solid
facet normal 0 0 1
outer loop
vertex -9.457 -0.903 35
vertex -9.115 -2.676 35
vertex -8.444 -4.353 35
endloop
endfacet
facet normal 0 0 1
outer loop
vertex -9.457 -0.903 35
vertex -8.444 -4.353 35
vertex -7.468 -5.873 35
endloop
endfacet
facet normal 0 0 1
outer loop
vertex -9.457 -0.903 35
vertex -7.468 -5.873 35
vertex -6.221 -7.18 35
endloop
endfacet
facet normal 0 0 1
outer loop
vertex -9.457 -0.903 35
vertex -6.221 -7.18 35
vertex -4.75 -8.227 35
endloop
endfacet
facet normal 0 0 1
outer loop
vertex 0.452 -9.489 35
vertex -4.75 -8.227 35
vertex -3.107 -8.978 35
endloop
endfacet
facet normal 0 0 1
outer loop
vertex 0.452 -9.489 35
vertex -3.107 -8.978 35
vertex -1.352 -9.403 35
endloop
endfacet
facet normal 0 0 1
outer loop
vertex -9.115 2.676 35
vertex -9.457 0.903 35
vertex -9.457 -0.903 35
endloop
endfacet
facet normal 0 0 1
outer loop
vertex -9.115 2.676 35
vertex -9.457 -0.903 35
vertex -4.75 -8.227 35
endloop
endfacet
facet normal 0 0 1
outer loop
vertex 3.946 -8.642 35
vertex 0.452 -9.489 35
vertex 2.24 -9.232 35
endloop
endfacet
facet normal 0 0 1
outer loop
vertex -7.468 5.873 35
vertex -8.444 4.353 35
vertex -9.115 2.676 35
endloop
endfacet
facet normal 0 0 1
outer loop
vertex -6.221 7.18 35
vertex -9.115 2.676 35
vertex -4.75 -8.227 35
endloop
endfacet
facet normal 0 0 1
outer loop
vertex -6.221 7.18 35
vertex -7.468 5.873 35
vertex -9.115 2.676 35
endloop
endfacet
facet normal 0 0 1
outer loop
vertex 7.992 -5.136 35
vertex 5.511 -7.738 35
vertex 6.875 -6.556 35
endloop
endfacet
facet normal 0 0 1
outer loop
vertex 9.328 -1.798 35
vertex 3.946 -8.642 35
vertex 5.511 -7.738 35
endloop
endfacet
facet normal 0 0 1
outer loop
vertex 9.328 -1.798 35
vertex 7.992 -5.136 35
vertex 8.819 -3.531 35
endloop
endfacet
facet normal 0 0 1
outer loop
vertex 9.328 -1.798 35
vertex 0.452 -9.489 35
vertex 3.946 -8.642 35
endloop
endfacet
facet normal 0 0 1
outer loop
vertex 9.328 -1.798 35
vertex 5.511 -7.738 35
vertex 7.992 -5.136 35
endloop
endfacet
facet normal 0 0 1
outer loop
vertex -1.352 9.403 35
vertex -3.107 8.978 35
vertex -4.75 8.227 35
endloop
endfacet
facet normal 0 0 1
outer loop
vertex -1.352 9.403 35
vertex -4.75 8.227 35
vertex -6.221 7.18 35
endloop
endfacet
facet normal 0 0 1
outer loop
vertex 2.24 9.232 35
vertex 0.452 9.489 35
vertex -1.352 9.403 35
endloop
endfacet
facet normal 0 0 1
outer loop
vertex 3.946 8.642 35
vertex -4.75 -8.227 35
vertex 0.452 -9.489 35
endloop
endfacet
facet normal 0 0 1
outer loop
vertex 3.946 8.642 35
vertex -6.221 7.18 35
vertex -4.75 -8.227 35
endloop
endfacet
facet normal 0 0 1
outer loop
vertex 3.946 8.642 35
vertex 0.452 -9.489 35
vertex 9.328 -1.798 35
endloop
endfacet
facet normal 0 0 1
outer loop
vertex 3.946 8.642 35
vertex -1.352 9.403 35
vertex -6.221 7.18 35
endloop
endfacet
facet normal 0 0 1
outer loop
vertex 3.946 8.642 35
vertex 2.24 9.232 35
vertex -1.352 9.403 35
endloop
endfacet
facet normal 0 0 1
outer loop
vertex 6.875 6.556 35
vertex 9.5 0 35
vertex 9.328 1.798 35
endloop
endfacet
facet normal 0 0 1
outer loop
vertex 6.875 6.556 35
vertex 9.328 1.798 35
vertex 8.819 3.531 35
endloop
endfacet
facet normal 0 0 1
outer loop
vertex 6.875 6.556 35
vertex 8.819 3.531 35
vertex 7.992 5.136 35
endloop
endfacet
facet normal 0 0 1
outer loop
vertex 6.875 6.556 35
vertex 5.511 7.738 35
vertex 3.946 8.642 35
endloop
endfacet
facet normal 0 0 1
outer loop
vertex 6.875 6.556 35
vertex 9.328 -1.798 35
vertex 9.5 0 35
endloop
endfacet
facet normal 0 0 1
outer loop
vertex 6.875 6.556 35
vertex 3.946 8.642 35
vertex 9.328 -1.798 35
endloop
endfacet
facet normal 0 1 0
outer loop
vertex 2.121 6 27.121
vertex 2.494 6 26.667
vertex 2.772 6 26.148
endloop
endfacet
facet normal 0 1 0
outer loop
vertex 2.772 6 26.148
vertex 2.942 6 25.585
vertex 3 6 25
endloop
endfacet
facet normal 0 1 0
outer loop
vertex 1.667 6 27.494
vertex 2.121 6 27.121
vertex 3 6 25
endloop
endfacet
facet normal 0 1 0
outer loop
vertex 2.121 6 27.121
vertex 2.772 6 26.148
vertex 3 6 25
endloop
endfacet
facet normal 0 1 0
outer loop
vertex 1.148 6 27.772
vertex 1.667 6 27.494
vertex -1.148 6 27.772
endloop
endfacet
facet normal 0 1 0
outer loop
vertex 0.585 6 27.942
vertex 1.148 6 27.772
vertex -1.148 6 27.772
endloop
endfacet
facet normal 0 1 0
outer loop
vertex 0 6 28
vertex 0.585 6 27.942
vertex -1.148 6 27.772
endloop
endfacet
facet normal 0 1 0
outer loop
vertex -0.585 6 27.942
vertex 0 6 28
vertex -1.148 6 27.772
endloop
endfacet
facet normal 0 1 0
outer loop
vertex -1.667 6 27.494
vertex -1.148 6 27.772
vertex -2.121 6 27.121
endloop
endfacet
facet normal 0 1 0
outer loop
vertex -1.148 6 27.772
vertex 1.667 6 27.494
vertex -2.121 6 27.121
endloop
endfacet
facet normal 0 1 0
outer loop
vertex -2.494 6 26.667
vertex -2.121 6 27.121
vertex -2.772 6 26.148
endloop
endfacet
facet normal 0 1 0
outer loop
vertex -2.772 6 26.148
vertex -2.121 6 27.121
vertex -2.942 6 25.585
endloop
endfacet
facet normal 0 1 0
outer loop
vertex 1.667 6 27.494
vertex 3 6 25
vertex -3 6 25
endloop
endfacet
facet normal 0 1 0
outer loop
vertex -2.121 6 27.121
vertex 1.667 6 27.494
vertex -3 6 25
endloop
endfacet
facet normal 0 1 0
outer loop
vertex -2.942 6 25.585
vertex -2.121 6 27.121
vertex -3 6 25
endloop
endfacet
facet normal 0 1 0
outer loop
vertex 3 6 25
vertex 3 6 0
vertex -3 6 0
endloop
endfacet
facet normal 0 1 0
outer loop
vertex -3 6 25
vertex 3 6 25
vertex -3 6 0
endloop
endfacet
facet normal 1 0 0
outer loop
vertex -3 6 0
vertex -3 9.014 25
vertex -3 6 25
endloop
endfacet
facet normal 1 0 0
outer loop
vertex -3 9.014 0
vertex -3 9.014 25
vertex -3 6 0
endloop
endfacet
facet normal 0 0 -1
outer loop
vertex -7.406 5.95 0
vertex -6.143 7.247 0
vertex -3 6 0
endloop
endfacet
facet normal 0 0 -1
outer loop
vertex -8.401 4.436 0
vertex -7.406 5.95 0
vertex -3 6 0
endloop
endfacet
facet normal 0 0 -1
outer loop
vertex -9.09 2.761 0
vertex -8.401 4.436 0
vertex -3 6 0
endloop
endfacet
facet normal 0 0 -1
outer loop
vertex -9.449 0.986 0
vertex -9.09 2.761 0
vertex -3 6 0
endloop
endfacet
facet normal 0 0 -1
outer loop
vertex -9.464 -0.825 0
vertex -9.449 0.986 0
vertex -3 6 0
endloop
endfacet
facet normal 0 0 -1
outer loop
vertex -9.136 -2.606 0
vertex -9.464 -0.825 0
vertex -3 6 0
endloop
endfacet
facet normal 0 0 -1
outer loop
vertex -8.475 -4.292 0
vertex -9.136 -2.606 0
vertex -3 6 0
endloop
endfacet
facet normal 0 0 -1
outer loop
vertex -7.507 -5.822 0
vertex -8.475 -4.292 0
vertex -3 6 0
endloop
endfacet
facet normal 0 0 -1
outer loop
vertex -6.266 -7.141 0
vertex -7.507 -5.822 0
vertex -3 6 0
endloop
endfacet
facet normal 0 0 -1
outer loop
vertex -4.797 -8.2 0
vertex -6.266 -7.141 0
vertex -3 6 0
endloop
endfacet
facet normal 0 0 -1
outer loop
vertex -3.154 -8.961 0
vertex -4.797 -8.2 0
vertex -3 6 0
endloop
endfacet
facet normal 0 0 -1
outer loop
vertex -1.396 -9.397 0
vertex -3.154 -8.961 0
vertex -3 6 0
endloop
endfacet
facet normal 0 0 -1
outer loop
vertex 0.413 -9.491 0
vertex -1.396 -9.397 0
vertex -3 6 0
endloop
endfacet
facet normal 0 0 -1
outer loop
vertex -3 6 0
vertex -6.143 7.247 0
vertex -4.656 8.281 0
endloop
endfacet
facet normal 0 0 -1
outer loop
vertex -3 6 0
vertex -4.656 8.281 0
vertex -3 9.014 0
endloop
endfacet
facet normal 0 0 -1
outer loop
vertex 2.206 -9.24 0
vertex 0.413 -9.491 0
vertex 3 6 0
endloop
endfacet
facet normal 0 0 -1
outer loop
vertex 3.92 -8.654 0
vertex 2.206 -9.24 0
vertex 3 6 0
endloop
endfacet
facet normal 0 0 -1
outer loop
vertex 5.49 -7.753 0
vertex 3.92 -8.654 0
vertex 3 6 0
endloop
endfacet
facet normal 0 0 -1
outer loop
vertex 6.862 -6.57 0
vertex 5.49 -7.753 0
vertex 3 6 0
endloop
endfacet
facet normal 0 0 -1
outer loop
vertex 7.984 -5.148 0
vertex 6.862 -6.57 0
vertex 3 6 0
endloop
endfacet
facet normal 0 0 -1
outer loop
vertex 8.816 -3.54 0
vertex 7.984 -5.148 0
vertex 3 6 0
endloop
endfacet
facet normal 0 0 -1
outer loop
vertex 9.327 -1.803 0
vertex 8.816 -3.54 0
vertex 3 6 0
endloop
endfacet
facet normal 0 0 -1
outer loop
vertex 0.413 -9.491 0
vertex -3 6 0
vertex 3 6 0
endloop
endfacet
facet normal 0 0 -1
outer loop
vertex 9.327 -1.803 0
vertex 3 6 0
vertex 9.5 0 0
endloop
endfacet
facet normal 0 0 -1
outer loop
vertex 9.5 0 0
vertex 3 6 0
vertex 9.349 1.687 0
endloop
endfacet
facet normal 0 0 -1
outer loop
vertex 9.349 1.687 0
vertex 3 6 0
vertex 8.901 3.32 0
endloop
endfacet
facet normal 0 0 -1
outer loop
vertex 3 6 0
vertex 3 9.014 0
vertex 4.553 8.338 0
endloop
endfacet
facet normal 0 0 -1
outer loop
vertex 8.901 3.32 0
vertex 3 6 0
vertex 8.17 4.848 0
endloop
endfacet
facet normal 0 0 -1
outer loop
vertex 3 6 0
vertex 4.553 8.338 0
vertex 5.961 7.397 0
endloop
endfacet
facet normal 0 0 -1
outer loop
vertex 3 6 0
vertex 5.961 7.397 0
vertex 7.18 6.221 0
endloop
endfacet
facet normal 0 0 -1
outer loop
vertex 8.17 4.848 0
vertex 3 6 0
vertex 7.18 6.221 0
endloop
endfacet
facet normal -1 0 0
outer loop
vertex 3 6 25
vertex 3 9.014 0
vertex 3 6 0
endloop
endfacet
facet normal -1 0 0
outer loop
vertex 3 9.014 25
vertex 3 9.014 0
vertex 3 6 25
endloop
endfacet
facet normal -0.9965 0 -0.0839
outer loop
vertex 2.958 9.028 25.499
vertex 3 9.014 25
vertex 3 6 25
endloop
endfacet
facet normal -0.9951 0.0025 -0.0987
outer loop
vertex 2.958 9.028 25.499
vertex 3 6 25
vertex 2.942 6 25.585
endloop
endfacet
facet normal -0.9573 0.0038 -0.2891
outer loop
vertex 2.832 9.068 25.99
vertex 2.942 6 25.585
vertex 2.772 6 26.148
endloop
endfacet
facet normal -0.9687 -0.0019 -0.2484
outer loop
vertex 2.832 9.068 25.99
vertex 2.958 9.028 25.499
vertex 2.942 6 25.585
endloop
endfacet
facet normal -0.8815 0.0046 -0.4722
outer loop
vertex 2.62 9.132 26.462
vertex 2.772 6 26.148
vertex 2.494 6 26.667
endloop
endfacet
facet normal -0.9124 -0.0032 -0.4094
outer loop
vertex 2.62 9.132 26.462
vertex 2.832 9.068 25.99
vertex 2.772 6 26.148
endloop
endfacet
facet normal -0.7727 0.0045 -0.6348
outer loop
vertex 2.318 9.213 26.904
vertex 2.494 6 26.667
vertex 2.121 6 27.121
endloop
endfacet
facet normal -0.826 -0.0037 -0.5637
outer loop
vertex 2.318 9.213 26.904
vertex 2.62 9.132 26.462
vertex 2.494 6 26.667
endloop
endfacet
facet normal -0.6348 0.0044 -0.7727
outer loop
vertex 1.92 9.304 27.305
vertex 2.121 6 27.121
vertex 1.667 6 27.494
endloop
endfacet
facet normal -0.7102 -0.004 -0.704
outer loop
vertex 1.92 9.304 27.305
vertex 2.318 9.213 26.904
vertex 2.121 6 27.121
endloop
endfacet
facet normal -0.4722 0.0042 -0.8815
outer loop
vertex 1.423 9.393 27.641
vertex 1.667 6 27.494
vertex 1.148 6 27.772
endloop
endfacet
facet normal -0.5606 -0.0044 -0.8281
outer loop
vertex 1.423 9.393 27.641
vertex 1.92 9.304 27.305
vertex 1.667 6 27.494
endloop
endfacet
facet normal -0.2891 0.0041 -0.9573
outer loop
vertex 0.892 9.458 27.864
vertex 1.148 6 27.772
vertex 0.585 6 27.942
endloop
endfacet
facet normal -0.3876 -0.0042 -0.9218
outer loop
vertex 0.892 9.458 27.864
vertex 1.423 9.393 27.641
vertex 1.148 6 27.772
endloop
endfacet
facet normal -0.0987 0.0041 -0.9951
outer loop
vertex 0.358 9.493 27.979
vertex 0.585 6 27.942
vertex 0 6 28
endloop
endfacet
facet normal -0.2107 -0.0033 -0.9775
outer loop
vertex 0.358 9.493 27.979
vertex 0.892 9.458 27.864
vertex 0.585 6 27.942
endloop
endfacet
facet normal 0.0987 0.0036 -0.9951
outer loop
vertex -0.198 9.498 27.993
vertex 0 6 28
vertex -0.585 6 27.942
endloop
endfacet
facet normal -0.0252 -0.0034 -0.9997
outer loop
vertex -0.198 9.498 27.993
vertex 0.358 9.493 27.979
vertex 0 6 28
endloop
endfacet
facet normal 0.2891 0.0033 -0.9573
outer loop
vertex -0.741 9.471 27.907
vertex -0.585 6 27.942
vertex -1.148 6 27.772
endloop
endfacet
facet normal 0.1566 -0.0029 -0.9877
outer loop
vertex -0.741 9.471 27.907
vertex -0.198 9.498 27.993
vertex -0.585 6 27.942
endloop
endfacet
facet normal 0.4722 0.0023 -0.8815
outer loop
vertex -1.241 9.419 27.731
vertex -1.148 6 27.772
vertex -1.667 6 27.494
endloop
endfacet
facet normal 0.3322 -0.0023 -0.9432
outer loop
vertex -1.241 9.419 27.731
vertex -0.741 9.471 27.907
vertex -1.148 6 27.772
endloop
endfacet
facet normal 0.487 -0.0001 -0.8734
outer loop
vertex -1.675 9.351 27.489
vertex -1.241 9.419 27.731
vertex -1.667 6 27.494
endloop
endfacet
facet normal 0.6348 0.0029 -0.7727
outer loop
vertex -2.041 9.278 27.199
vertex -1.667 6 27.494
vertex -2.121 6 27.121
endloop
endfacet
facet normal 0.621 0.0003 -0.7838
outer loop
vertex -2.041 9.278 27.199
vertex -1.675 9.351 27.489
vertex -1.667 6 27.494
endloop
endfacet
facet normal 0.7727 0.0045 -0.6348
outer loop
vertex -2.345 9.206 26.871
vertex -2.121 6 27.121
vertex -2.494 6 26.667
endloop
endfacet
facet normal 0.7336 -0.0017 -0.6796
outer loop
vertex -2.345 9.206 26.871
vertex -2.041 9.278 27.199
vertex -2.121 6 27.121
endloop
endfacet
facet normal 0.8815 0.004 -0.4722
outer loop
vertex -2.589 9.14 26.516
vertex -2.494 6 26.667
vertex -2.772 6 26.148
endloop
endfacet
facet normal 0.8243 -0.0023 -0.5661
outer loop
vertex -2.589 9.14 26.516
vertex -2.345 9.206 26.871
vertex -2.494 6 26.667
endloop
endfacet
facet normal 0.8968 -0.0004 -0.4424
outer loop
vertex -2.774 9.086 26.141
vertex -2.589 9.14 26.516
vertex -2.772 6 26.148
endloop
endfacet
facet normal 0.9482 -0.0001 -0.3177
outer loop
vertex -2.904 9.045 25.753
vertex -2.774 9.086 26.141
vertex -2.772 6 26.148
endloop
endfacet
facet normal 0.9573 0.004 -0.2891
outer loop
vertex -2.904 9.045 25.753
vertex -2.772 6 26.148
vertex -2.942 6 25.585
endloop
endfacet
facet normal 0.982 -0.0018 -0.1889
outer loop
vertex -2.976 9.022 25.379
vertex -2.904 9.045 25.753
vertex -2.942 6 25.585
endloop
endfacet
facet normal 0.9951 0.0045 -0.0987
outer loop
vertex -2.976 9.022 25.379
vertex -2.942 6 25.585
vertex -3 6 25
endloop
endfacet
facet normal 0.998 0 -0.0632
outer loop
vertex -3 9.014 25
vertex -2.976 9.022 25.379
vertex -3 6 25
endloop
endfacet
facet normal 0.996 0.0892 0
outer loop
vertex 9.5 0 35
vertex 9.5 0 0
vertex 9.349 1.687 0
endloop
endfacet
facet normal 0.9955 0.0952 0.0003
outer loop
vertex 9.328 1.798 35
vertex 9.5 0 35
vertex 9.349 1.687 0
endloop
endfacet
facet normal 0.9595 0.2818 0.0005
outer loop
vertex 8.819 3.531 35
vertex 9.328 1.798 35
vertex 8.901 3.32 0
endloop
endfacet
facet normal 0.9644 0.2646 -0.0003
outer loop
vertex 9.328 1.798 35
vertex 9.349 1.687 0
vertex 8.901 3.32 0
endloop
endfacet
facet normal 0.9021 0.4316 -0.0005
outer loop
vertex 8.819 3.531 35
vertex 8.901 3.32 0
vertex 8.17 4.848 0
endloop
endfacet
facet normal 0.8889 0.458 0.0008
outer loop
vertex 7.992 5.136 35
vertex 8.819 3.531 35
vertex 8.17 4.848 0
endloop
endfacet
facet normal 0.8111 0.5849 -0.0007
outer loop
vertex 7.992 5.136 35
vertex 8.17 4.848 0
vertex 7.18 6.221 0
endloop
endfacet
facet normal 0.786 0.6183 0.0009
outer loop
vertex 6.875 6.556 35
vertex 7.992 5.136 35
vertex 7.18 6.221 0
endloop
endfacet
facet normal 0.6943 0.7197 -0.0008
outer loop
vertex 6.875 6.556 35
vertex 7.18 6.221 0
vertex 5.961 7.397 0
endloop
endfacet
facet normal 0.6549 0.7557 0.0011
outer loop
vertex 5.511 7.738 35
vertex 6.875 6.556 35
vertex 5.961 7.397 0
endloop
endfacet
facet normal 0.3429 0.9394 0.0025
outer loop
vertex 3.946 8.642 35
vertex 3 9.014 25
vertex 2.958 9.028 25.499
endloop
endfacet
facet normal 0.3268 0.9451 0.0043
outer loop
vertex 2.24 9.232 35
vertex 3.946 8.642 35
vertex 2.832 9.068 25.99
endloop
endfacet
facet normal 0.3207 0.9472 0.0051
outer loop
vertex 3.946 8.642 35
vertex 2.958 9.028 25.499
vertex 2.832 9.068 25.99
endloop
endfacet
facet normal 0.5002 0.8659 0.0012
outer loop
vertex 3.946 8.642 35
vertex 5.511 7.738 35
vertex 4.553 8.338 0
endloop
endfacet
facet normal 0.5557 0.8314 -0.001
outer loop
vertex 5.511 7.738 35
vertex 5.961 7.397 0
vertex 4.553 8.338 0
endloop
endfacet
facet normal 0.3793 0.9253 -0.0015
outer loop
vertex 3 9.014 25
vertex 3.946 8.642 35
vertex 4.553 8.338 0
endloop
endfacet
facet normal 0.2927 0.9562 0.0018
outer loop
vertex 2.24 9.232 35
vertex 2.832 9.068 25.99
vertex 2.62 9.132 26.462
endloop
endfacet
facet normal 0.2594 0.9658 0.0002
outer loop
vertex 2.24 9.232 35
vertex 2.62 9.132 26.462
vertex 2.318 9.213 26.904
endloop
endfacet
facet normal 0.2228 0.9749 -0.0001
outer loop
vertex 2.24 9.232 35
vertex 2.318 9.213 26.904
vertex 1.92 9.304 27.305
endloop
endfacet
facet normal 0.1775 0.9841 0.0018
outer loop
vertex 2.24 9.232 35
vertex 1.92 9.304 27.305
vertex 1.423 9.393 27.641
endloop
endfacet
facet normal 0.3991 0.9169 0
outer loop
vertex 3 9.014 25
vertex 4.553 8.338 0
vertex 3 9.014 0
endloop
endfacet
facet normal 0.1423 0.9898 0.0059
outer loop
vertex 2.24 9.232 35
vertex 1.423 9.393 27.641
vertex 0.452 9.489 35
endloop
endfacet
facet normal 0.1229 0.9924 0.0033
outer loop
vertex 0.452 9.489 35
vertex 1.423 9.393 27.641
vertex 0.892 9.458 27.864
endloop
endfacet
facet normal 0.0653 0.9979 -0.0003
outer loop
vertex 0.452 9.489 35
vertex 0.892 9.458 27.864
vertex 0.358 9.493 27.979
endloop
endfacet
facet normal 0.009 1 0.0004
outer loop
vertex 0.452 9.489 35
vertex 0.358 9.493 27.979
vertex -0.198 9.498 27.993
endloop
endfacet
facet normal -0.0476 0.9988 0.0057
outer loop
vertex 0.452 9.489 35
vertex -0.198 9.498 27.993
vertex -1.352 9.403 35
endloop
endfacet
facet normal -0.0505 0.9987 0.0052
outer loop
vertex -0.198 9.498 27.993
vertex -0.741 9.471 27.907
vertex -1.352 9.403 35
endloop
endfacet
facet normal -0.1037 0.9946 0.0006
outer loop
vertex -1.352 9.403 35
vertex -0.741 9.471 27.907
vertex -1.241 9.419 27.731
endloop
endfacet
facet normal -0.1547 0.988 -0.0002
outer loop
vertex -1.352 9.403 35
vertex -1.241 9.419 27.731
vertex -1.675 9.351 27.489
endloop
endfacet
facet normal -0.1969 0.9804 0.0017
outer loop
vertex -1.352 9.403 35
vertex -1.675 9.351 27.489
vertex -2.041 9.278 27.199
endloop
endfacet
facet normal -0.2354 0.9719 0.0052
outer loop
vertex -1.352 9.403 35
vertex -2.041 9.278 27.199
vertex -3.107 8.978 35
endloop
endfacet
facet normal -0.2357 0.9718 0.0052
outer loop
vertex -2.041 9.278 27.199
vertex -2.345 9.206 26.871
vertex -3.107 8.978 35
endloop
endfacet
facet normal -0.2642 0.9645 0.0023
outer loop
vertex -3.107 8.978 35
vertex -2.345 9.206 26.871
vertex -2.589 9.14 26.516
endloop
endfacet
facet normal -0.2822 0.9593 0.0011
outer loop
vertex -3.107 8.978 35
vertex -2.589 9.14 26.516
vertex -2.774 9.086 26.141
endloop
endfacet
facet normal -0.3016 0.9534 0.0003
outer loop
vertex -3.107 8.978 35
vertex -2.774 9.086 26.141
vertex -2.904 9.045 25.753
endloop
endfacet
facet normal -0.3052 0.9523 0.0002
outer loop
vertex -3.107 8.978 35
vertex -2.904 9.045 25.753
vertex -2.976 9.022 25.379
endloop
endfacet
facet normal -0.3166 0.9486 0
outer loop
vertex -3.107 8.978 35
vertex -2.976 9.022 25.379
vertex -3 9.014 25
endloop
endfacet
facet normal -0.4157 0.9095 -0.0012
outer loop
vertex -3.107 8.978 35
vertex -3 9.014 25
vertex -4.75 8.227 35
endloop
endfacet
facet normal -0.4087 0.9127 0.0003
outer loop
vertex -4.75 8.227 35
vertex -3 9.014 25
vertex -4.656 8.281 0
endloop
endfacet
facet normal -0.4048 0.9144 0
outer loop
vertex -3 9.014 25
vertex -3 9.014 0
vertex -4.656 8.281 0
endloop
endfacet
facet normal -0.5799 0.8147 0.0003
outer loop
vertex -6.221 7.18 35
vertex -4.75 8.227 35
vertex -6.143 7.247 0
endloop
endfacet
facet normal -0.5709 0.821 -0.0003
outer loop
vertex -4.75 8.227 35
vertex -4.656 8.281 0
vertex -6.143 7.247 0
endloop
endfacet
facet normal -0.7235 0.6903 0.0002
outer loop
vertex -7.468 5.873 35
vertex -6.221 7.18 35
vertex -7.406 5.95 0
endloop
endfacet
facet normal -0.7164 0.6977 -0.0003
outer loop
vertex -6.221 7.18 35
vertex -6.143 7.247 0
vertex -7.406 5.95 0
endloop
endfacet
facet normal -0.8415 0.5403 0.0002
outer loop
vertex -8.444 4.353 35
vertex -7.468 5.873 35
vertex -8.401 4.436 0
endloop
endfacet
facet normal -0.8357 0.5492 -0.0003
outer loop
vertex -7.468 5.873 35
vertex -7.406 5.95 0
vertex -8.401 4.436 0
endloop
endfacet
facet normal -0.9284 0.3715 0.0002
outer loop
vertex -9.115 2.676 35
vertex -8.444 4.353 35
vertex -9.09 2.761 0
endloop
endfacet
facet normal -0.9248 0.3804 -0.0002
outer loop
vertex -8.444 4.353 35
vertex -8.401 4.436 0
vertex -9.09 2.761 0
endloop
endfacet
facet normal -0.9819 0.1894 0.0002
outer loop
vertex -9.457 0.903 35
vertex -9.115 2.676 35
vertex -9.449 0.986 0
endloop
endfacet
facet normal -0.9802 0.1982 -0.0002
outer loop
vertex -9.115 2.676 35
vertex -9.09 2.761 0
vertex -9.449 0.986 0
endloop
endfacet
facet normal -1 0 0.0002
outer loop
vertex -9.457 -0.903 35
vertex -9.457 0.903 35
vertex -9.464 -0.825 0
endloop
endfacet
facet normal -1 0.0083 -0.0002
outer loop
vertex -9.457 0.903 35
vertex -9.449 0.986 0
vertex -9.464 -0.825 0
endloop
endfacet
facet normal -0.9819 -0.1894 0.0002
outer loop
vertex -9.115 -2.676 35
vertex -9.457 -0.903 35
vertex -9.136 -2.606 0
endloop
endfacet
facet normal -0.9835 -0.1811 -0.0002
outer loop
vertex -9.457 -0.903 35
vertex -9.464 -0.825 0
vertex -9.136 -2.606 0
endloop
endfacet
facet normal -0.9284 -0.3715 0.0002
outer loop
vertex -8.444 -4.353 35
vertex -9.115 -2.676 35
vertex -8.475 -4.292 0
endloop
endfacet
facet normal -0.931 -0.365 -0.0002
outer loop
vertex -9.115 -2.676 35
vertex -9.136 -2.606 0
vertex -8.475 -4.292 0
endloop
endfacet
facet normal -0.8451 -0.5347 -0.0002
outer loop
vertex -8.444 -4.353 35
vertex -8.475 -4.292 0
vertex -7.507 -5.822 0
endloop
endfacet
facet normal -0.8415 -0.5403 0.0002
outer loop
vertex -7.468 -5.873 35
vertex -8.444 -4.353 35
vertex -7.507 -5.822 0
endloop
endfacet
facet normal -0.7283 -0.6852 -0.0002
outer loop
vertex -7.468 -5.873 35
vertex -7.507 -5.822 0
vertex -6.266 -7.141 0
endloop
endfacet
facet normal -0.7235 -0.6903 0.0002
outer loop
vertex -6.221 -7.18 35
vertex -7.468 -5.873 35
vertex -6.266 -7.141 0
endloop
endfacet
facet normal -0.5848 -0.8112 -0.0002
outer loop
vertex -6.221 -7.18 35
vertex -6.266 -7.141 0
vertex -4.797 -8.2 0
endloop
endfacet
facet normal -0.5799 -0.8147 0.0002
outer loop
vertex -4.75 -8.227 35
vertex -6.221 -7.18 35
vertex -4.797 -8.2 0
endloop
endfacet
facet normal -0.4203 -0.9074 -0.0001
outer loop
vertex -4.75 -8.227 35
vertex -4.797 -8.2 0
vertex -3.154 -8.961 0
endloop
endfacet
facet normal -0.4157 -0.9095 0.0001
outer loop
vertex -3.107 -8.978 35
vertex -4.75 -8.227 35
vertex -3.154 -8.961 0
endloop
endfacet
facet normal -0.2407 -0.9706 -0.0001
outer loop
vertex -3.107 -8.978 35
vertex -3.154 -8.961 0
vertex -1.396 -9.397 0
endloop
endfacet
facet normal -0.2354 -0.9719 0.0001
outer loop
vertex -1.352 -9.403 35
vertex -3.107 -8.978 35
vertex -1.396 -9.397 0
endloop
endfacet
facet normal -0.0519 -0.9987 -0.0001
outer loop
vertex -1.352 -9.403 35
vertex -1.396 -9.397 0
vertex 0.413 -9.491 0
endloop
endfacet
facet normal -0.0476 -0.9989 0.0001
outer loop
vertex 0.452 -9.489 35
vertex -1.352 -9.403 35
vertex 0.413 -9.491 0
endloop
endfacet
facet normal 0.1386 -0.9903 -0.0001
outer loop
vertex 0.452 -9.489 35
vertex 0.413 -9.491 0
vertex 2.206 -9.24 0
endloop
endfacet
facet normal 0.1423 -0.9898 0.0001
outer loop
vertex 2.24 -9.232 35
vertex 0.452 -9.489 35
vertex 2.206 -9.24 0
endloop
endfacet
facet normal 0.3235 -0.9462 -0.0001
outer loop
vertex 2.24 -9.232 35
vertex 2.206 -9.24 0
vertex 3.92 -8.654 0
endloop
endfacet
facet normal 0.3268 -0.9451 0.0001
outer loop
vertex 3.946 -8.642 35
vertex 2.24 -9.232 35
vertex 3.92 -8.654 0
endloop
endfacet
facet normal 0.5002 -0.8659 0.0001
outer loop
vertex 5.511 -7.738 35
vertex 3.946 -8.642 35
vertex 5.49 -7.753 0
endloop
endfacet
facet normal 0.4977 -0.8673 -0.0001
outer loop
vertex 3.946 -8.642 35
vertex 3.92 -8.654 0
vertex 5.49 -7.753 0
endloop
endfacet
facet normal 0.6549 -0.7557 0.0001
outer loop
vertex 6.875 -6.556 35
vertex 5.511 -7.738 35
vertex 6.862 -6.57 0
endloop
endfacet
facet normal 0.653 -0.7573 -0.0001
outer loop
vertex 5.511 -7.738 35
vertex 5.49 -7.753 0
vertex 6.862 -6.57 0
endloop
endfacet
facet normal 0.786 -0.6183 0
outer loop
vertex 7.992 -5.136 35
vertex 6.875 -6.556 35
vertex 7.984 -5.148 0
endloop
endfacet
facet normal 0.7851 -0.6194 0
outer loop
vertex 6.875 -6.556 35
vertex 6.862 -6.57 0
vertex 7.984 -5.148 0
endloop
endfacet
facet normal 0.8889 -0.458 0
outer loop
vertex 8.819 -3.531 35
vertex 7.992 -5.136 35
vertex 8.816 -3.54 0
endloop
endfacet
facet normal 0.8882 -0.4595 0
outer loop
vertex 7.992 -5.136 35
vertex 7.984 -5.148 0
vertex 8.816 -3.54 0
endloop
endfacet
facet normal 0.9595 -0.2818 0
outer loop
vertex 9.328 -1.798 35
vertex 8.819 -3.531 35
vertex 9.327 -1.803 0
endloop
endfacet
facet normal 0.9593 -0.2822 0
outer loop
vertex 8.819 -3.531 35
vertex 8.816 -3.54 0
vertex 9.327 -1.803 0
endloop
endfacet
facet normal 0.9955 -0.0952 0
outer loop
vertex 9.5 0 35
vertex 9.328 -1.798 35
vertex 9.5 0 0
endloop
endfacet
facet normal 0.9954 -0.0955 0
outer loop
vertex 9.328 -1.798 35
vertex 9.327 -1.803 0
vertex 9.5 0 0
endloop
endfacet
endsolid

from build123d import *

# Parameters (mm, degrees)
SKETCH1_R           = 9.5
BOSS_EXTRUDE1_DEPTH = 35
CUT_EXTRUDE1_DEPTH  = 4


with BuildPart() as part:
    # Sketch1 → Boss-Extrude1 (new body)
    with BuildSketch(Plane.XY):
        Circle(SKETCH1_R)
    extrude(amount=BOSS_EXTRUDE1_DEPTH)

    # Sketch4 → Cut-Extrude1 (cut)
    with BuildSketch(Plane(origin=(0, 10, 0), x_dir=(1, 0, 0), z_dir=(0, 1, 0))):
        with BuildLine():
            Line((3, 0), (3, -25))
            ThreePointArc((3, -25), (0, -28), (-3, -25))
            Line((-3, -25), (-3, 0))
            Line((-3, 0), (3, 0))
        make_face()
    extrude(amount=-CUT_EXTRUDE1_DEPTH, mode=Mode.SUBTRACT)


solid = part.part
